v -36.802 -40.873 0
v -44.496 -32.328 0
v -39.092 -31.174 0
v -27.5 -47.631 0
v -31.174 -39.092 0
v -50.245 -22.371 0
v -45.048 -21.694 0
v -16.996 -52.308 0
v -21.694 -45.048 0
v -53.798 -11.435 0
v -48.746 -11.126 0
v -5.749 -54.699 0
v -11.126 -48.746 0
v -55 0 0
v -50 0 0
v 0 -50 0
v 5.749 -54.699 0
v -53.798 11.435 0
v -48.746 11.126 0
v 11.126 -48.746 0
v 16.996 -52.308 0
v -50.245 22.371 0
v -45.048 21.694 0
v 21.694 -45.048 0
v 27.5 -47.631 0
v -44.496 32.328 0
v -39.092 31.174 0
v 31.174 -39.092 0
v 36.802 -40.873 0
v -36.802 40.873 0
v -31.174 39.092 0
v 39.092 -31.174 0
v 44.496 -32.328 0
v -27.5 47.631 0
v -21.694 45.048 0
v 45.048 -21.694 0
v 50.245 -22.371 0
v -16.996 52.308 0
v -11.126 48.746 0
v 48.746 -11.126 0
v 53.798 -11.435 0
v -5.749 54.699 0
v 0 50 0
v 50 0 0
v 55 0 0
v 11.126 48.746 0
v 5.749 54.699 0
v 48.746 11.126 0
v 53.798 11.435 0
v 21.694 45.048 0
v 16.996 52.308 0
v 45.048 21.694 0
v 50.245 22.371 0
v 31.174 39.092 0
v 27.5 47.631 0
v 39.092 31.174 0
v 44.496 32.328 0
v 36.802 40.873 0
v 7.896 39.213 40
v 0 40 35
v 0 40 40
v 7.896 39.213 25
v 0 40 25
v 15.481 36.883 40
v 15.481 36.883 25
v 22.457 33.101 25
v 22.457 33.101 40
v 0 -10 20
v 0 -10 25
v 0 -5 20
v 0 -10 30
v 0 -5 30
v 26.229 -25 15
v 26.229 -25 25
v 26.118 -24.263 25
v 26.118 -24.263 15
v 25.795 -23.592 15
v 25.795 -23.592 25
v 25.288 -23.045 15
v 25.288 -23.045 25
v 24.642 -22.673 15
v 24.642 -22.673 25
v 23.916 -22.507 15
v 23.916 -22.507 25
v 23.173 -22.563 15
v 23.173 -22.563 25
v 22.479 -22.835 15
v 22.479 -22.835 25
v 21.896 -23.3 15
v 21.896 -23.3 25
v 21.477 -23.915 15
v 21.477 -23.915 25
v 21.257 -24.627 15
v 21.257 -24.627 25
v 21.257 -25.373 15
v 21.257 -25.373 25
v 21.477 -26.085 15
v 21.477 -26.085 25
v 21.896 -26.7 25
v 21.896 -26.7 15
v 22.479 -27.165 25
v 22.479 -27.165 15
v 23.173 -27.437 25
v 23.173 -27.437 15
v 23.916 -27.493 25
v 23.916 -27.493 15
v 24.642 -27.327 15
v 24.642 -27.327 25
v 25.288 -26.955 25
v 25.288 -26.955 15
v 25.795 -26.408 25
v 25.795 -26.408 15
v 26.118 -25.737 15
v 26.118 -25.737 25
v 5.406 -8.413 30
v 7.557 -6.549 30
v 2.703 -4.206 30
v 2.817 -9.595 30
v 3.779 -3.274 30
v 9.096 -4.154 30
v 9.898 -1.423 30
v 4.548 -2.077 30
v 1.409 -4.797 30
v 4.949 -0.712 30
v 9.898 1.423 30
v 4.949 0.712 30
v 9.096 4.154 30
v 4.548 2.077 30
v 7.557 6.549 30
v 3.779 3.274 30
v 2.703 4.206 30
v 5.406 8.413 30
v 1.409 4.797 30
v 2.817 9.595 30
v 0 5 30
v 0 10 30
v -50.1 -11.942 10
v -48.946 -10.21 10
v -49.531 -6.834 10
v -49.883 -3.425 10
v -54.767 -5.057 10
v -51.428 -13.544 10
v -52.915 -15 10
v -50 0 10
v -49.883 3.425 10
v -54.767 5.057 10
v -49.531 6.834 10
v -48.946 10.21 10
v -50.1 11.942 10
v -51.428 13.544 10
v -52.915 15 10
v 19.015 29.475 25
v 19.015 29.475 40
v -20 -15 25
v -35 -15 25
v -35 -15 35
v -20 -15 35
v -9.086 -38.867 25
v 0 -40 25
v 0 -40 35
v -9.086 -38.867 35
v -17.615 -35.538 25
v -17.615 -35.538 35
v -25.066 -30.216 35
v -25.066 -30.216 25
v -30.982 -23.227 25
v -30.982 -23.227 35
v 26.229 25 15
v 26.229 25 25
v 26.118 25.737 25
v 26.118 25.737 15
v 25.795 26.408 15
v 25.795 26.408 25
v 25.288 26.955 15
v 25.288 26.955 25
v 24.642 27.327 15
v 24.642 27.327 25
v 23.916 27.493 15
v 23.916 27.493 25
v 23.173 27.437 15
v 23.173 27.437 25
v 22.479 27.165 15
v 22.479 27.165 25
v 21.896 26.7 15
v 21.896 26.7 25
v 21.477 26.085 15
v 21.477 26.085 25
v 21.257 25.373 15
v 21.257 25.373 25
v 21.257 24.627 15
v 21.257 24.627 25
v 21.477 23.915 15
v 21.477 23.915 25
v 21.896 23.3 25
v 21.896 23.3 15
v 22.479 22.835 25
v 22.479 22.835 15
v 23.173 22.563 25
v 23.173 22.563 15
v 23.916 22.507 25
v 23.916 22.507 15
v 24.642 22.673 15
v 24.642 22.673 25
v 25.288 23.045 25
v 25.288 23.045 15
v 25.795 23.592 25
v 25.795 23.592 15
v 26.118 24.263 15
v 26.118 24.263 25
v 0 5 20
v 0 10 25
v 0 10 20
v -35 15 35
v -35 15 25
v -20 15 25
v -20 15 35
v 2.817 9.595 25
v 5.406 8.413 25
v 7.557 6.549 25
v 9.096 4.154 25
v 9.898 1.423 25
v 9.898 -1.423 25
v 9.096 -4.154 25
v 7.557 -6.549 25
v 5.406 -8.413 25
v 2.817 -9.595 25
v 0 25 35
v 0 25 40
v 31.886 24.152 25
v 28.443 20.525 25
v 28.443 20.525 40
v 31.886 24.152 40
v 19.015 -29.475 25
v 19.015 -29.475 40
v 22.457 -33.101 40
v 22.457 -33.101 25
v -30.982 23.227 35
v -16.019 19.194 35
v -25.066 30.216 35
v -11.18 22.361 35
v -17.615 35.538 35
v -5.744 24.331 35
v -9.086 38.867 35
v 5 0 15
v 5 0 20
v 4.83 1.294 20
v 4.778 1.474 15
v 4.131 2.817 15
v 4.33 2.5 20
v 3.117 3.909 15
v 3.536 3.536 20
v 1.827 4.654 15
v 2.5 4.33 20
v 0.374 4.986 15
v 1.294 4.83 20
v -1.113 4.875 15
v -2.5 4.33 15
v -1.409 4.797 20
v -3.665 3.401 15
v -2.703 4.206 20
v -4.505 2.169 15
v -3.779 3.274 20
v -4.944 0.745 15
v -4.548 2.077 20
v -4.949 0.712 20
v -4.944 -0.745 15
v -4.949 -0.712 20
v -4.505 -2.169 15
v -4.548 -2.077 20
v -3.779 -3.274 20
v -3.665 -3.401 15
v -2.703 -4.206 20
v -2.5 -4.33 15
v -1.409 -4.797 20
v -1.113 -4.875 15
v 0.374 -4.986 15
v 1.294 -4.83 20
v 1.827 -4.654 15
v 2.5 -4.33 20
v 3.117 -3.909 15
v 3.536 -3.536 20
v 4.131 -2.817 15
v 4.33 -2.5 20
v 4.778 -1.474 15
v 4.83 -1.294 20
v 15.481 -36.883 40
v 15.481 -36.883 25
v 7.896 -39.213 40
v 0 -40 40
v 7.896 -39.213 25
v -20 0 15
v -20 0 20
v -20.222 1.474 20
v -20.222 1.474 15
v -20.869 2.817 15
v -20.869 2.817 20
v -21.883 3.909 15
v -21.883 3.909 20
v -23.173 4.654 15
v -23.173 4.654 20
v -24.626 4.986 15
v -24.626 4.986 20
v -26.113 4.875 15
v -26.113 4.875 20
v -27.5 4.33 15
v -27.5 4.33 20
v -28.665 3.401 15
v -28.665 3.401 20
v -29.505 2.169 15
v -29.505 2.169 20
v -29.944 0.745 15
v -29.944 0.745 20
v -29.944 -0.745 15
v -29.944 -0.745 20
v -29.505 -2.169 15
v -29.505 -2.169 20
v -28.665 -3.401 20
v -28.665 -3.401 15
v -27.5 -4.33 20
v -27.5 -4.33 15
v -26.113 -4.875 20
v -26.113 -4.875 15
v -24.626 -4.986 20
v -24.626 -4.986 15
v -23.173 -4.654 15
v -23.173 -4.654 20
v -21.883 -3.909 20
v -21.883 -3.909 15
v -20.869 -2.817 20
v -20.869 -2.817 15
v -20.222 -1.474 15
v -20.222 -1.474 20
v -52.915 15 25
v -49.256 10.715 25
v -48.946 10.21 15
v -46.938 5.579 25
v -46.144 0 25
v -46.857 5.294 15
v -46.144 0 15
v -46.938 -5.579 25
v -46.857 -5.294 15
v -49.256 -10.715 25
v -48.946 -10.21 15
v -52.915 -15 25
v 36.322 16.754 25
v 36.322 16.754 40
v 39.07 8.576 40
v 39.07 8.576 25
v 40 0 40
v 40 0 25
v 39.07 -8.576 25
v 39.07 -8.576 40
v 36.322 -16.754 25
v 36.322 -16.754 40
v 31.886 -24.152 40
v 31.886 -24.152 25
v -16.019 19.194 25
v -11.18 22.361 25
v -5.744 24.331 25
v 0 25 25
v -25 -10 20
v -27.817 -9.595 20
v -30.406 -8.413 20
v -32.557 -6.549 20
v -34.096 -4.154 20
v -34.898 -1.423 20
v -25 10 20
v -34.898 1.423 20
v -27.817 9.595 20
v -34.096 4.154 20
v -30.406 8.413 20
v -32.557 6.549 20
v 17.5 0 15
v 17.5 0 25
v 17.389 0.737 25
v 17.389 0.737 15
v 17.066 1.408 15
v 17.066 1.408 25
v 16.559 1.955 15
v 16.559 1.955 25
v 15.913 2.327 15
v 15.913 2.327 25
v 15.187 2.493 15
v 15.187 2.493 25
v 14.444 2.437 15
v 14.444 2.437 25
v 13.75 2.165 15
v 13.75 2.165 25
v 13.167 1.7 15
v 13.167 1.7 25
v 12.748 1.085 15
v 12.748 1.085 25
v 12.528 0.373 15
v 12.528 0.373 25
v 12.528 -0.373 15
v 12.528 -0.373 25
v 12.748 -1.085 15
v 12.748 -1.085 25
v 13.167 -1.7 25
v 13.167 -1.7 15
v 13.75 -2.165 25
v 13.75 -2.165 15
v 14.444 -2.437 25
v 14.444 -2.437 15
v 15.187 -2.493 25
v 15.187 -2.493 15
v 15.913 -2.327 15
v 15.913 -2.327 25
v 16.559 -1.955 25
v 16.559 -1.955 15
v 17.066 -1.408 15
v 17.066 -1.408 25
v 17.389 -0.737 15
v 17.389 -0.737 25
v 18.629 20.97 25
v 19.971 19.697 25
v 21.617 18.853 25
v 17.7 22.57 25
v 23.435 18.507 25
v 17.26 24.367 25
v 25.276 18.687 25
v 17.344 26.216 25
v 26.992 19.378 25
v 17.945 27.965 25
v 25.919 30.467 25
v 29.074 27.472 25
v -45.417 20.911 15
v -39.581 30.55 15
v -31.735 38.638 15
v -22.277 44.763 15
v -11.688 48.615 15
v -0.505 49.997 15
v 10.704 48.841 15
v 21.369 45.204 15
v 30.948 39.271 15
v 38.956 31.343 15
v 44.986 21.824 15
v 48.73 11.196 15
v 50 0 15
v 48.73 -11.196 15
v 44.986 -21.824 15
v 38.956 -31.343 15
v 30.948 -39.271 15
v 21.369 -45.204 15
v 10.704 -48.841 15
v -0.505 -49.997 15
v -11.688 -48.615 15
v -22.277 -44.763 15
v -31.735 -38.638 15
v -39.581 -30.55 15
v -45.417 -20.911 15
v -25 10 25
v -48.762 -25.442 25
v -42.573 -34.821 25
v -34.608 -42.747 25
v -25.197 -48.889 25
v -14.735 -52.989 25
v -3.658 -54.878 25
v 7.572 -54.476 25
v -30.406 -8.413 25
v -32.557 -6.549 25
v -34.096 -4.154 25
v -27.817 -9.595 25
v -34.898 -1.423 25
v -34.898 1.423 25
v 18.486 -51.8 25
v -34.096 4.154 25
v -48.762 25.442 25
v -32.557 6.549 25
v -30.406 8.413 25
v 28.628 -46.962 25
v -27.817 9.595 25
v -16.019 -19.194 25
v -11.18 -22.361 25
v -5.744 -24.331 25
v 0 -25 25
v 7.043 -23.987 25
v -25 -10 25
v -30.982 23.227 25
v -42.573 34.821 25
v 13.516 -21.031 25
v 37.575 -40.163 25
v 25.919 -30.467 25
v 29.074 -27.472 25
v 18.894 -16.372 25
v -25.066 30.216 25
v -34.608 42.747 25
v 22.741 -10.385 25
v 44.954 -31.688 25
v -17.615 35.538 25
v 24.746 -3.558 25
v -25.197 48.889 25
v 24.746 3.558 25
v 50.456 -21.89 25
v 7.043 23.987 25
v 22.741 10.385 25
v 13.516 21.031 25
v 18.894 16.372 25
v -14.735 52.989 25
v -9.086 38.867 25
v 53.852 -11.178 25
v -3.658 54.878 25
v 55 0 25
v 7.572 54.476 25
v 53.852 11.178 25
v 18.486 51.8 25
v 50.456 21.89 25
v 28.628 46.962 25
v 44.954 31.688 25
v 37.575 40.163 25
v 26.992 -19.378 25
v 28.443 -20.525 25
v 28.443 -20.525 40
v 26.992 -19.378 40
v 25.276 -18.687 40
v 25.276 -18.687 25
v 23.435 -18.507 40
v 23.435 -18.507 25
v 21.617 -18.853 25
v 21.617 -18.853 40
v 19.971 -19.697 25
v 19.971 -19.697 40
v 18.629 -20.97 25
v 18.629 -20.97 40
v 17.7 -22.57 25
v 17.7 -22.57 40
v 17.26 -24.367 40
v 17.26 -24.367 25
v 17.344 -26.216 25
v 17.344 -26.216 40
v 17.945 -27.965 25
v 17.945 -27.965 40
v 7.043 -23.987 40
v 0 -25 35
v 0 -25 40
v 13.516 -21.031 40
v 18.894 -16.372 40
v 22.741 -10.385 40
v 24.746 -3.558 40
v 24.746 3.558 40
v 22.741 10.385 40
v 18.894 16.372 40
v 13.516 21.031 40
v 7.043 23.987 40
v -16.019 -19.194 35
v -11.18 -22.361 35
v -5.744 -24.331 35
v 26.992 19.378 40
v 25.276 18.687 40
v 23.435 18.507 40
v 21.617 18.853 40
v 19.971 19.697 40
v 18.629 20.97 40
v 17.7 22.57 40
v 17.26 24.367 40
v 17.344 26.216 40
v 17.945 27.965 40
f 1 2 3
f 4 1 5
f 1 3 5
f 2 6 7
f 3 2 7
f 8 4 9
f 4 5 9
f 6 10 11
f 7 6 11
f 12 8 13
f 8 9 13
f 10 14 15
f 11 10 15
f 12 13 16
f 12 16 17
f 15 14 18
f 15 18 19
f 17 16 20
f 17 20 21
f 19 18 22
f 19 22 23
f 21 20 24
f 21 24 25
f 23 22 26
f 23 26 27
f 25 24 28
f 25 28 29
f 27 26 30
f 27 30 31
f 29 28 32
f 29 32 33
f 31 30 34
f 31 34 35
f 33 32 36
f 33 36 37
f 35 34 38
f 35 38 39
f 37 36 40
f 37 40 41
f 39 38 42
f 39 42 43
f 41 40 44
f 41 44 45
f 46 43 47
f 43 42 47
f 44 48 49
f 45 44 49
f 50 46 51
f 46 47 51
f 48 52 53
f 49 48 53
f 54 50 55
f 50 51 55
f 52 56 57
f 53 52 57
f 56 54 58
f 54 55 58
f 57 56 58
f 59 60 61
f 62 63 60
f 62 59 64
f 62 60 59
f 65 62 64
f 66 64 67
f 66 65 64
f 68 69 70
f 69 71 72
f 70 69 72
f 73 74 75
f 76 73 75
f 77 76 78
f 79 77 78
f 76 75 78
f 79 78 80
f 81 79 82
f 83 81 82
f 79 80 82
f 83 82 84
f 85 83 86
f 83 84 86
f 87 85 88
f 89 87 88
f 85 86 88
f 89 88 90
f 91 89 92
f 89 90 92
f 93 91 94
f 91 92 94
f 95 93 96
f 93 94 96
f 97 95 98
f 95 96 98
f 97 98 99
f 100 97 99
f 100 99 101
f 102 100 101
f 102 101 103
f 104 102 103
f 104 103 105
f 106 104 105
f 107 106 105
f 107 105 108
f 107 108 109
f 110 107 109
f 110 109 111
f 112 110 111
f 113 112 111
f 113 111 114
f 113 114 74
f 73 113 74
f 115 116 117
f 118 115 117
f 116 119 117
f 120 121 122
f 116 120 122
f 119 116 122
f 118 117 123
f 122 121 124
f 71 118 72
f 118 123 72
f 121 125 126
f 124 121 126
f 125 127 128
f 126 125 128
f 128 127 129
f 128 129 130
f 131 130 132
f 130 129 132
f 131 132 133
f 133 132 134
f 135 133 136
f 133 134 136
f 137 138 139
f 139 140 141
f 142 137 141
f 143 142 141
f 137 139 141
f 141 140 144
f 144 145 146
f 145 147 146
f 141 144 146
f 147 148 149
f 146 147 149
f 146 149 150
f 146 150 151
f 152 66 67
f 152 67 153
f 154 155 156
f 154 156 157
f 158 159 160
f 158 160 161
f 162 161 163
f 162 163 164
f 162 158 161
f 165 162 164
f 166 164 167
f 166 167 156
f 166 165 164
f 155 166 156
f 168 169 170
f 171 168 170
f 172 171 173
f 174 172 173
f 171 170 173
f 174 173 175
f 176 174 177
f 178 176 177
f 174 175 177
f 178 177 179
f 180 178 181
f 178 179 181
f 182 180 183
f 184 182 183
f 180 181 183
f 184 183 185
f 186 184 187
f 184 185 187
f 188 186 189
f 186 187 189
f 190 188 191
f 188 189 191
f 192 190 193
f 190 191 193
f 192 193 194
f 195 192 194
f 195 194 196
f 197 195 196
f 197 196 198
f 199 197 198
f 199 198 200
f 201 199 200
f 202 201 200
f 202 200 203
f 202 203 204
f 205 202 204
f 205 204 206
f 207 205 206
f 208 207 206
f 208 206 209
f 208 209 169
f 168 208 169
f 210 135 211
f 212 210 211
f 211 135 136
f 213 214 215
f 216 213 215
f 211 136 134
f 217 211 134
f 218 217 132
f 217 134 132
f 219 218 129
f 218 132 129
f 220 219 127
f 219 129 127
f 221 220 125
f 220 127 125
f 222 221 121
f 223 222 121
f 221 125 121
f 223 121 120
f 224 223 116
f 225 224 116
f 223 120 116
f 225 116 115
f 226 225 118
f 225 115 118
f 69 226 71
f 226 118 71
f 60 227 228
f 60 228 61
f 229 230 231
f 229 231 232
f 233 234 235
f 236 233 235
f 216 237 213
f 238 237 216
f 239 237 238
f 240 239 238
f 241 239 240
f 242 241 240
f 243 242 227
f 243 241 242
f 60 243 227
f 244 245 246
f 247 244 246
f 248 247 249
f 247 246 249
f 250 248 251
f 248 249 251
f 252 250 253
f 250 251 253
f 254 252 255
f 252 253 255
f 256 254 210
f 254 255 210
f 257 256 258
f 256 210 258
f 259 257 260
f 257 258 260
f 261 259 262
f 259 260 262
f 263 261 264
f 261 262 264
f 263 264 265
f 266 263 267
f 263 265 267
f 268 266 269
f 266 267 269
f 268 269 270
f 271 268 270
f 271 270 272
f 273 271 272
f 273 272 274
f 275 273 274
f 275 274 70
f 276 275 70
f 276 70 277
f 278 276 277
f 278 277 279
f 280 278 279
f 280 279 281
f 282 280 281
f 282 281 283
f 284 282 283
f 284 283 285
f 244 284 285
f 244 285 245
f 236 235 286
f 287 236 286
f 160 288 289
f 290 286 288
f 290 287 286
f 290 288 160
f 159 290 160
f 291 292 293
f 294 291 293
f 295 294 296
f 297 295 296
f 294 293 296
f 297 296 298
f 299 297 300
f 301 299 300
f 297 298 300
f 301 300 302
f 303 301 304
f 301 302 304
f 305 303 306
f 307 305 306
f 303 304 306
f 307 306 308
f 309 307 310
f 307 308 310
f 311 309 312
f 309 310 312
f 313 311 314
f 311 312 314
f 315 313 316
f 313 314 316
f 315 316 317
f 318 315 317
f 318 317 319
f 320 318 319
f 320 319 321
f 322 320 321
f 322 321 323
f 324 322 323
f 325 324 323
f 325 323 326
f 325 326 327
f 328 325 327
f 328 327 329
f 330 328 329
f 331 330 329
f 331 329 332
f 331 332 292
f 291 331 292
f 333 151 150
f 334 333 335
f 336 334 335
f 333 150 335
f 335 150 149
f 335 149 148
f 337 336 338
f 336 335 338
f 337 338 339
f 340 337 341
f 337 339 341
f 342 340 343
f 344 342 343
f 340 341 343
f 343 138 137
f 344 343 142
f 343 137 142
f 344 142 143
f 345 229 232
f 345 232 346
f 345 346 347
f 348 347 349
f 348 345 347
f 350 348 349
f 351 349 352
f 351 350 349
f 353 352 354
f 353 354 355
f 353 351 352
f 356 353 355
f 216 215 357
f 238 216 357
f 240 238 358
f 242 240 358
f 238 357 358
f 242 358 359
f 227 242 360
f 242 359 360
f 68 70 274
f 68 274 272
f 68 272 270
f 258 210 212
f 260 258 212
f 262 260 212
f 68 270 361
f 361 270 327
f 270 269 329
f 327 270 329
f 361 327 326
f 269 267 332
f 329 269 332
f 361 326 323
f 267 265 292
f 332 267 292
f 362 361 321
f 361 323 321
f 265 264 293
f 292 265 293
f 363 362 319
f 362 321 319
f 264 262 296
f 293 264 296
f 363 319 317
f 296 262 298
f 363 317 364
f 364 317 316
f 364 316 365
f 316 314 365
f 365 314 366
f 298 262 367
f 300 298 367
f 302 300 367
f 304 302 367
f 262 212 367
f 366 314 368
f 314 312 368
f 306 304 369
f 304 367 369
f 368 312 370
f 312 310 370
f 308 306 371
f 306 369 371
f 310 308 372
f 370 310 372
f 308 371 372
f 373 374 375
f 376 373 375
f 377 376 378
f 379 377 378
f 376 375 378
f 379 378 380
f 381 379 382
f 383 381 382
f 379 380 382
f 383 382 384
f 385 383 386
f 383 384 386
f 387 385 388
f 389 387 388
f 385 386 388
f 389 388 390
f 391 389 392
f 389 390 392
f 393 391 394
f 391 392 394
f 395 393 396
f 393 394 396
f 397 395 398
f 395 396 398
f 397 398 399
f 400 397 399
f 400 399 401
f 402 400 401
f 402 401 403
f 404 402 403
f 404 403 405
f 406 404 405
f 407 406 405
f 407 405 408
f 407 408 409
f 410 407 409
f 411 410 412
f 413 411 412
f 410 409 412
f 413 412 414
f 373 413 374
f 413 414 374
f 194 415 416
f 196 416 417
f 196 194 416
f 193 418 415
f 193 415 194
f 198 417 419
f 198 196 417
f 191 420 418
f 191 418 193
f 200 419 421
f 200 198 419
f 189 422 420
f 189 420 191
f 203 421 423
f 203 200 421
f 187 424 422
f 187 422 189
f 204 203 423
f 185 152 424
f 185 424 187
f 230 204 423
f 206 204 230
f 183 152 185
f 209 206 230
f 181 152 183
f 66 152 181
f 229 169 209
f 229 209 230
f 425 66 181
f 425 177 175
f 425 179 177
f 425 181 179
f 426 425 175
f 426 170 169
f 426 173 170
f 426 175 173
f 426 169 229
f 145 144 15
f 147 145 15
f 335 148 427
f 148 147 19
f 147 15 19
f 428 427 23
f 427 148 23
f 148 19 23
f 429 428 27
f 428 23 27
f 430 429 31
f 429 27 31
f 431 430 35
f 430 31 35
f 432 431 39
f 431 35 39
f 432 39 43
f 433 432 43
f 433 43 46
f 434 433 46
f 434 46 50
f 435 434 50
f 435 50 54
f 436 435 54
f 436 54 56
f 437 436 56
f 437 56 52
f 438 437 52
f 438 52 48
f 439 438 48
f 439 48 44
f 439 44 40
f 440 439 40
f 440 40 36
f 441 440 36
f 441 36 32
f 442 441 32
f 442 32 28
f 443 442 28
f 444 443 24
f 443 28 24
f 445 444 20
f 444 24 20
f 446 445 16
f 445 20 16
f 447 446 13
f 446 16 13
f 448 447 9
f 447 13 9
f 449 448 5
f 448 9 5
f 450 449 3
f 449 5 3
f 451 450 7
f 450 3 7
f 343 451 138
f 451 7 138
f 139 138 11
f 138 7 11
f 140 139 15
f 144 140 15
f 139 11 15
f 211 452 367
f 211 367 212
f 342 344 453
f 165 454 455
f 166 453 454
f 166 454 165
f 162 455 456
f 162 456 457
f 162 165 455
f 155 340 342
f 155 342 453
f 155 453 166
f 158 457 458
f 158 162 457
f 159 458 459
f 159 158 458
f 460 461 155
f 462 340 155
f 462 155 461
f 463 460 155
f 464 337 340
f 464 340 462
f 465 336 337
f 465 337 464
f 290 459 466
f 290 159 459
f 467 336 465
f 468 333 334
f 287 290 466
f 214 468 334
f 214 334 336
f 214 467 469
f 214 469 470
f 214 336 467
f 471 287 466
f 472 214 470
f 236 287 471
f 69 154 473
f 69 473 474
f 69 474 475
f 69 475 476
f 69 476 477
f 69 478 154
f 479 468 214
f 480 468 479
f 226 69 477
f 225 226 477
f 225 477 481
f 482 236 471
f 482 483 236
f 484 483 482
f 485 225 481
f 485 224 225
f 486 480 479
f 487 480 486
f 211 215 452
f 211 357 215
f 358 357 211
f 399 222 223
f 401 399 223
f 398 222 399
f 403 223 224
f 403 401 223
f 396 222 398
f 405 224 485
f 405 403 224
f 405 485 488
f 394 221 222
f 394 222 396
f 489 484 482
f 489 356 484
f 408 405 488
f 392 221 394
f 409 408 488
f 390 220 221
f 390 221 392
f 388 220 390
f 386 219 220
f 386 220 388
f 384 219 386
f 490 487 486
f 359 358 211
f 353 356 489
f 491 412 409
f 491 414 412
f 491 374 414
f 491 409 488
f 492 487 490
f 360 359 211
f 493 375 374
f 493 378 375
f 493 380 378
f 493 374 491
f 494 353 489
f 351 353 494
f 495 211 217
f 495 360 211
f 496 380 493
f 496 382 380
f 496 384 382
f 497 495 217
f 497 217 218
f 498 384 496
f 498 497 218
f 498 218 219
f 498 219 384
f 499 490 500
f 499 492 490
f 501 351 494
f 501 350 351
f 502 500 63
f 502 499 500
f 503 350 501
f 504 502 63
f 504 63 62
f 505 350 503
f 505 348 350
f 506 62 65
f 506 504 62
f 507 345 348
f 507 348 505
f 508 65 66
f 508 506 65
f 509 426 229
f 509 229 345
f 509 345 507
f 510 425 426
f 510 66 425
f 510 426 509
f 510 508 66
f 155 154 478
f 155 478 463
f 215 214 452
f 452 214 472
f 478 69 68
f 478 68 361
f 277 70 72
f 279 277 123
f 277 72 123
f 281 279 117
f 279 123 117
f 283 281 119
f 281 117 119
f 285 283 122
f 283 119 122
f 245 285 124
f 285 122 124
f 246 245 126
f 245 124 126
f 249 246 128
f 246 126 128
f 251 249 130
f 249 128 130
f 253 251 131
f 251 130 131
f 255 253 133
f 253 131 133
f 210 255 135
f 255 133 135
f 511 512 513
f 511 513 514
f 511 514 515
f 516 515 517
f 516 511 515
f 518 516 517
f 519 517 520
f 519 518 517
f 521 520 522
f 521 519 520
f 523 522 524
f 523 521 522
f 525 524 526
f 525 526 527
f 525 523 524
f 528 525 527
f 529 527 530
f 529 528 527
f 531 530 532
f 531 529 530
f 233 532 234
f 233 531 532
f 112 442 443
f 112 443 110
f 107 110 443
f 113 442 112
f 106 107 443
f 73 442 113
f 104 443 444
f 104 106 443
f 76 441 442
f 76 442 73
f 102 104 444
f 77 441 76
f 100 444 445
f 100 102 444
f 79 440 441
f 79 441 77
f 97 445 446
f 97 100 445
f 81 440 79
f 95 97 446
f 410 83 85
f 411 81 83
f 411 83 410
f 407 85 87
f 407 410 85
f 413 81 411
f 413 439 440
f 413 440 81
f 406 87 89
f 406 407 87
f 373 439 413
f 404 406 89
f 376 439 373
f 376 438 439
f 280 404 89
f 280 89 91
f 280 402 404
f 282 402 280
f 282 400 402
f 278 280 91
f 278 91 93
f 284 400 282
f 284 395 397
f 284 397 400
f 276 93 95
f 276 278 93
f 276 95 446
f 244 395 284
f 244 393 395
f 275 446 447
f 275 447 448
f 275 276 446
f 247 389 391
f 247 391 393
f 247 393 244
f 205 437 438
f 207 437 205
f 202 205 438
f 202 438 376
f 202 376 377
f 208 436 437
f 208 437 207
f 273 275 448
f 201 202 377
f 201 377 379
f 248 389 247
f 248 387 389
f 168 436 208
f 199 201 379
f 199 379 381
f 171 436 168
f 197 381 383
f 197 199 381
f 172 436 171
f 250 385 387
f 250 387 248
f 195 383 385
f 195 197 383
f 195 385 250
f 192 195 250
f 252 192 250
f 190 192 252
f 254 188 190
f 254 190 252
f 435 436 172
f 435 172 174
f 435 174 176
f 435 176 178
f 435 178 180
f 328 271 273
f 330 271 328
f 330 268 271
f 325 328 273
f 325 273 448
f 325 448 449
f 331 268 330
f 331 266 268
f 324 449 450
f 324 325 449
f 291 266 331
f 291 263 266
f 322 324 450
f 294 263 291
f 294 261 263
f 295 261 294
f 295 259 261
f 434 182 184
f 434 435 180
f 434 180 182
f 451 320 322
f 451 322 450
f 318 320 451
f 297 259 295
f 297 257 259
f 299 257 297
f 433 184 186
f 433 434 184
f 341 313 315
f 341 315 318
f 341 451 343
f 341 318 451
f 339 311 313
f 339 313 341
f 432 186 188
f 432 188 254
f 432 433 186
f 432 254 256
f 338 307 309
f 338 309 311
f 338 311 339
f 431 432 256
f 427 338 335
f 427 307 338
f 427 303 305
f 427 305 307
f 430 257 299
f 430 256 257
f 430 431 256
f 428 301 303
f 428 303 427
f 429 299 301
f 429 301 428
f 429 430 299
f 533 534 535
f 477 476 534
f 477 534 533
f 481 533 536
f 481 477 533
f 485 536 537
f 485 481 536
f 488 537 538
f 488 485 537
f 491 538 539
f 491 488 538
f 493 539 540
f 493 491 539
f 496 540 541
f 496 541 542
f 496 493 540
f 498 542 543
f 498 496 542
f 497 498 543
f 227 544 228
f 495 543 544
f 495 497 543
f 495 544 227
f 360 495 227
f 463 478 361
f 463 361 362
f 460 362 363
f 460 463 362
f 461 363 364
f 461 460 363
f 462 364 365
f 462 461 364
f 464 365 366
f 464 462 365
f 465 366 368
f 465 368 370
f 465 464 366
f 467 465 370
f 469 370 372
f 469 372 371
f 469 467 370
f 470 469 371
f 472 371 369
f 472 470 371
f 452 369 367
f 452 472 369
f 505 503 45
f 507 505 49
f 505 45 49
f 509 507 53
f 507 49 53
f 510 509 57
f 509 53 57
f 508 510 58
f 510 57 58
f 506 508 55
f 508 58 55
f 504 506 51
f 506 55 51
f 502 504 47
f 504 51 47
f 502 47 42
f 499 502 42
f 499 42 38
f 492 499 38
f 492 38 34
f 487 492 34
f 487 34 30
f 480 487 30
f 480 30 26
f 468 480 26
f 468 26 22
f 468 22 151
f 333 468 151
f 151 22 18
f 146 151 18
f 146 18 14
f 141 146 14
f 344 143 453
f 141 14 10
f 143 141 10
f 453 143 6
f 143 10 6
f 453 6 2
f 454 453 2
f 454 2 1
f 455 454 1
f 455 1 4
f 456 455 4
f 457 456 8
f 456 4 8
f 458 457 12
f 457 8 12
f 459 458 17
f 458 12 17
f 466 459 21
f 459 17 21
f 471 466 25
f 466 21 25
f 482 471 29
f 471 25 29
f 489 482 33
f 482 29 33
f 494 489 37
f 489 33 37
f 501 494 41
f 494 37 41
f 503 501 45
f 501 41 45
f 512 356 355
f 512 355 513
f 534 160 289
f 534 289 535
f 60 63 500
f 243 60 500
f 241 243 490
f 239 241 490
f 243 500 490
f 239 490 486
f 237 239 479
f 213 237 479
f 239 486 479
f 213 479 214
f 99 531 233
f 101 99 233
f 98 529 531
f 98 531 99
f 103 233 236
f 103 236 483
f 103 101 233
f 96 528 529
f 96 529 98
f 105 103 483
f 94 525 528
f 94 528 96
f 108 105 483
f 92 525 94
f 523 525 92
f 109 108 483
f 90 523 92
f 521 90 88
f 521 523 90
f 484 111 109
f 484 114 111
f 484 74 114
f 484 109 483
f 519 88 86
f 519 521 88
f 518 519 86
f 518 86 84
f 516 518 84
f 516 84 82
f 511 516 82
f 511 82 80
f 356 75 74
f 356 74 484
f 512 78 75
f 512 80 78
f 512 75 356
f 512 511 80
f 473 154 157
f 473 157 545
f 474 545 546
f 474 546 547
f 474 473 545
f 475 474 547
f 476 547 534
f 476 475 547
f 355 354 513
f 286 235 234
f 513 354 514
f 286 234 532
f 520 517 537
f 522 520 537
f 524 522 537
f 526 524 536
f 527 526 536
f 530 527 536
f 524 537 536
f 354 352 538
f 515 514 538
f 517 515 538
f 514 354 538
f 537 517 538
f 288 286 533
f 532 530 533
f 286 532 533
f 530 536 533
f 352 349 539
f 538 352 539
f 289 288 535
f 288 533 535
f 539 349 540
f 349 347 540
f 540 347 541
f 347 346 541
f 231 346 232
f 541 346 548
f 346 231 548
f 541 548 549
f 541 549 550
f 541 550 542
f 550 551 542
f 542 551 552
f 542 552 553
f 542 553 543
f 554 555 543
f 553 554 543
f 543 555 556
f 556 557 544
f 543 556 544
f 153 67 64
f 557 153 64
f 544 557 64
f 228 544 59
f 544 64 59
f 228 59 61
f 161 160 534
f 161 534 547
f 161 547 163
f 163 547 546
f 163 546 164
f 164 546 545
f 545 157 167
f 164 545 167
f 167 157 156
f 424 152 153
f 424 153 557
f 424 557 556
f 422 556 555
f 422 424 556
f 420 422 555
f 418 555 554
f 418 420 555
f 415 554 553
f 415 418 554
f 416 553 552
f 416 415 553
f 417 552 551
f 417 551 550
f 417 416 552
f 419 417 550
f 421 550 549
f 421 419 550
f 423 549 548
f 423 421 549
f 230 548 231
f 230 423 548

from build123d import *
from build123d.topology import SkipClean

# Parameters (mm, degrees)
SKETCH3_R           = 55
BOSS_EXTRUDE2_DEPTH = 25
SKETCH4_R           = 50
CUT_EXTRUDE1_DEPTH  = 15
CUT_EXTRUDE2_START  = -15
CUT_EXTRUDE2_DEPTH  = 15
BOSS_EXTRUDE3_DEPTH = 10
BOSS_EXTRUDE4_DEPTH = 10
BOSS_EXTRUDE5_DEPTH = 15
CUT_EXTRUDE4_START  = -15
CUT_EXTRUDE4_DEPTH  = 15
SKETCH11_R          = 2.5
CUT_EXTRUDE7_DEPTH  = 25
SKETCH12_R          = 2.5
CUT_EXTRUDE9_DEPTH  = 10
CUT_EXTRUDE12_DEPTH = 5
SKETCH14_R          = 5
CUT_EXTRUDE13_DEPTH = 10
BOSS_EXTRUDE6_START = 10
BOSS_EXTRUDE6_DEPTH = 10


with BuildPart() as part:
    # Sketch3 → Boss-Extrude2 (new body)
    with BuildSketch(Plane.XY):
        Circle(SKETCH3_R)
    extrude(amount=BOSS_EXTRUDE2_DEPTH)

    # Sketch4 → Cut-Extrude1 (cut)
    with BuildSketch(Plane(origin=(0, 0, 0), x_dir=(-1, 0, 0), z_dir=(0, 0, -1))):
        Circle(SKETCH4_R)
    extrude(amount=-CUT_EXTRUDE1_DEPTH, mode=Mode.SUBTRACT)

    # Sketch5 → Cut-Extrude2 (cut)
    with BuildSketch(Plane.XY.offset(25).offset(CUT_EXTRUDE2_START)):
        with BuildLine():
            ThreePointArc((-52.915026221, 15), (-46.143782777, 0), (-52.915026221, -15))
            ThreePointArc((-52.915026221, -15), (-55, 0), (-52.915026221, 15))
        make_face()
    extrude(amount=CUT_EXTRUDE2_DEPTH, mode=Mode.SUBTRACT)

    # Sketch6 → Boss-Extrude3 (add)
    with BuildSketch(Plane.XY.offset(25)):
        with BuildLine():
            Line((-35, 15), (-20, 15))
            ThreePointArc((-20, 15), (-11.180339887, 22.360679775), (0, 25))
            Line((0, 25), (0, 40))
            ThreePointArc((0, 40), (-21.505813168, 33.108138435), (-35, 15))
        make_face()
    extrude(amount=BOSS_EXTRUDE3_DEPTH)

    # Sketch7 → Boss-Extrude4 (add)
    with BuildSketch(Plane.XY.offset(25)):
        with BuildLine():
            Line((-35, -15), (-20, -15))
            ThreePointArc((-20, -15), (-11.180339887, -22.360679775), (0, -25))
            Line((0, -25), (0, -40))
            ThreePointArc((0, -40), (-21.505813168, -33.108138435), (-35, -15))
        make_face()
    extrude(amount=BOSS_EXTRUDE4_DEPTH)

    # Sketch8 → Boss-Extrude5 (add)
    with SkipClean():  # the faces are left unmerged after this step: merging them gives an invalid solid
        with BuildSketch(Plane.XY.offset(25)):
            with BuildLine():
                Line((0, -40), (0, -25))
                ThreePointArc((0, -25), (25, 0), (0, 25))
                Line((0, 25), (0, 40))
                ThreePointArc((0, 40), (40, 0), (0, -40))
            make_face()
        extrude(amount=BOSS_EXTRUDE5_DEPTH)

    # Sketch9 → Cut-Extrude4 (cut)
    with SkipClean():  # the faces are left unmerged after this step: merging them gives an invalid solid
        with BuildSketch(Plane.XY.offset(40).offset(CUT_EXTRUDE4_START)):
            with BuildLine():
                Line((19.014552984, -29.474791897), (22.456700597, -33.101308106))
                ThreePointArc((22.456700597, -33.101308106), (27.537180907, -29.012129665), (31.885642738, -24.151724311))
                Line((31.885642738, -24.151724311), (28.443495125, -20.525208103))
                ThreePointArc((28.443495125, -20.525208103), (19.254232157, -20.285528929), (19.014552984, -29.474791897))
            make_face()
            with BuildLine():
                Line((22.456700597, 33.101308106), (19.014552984, 29.474791897))
                ThreePointArc((19.014552984, 29.474791897), (19.254232157, 20.285528929), (28.443495125, 20.525208103))
                Line((28.443495125, 20.525208103), (31.885642738, 24.151724311))
                ThreePointArc((31.885642738, 24.151724311), (27.537180907, 29.012129665), (22.456700597, 33.101308106))
            make_face()
        extrude(amount=CUT_EXTRUDE4_DEPTH, mode=Mode.SUBTRACT)

    # Sketch11 → Cut-Extrude7 (cut)
    with SkipClean():  # the faces are left unmerged after this step: merging them gives an invalid solid
        with BuildSketch(Plane.XY.offset(25)):
            with Locations((23.729024054, -25)):
                Circle(SKETCH11_R)
            with Locations((23.729024054, 25)):
                Circle(SKETCH11_R)
        extrude(amount=-CUT_EXTRUDE7_DEPTH, mode=Mode.SUBTRACT)

    # Sketch12 → Cut-Extrude9 (cut)
    with SkipClean():  # the faces are left unmerged after this step: merging them gives an invalid solid
        with BuildSketch(Plane.XY.offset(25)):
            with Locations((15, 0)):
                Circle(SKETCH12_R)
        extrude(amount=-CUT_EXTRUDE9_DEPTH, mode=Mode.SUBTRACT)

    # Sketch13 → Cut-Extrude12 (cut)
    with SkipClean():  # the faces are left unmerged after this step: merging them gives an invalid solid
        with BuildSketch(Plane.XY.offset(25)):
            with BuildLine():
                Line((-25, 10), (0, 10))
                ThreePointArc((0, 10), (10, 0), (0, -10))
                Line((0, -10), (-25, -10))
                ThreePointArc((-25, -10), (-35, 0), (-25, 10))
            make_face()
        extrude(amount=-CUT_EXTRUDE12_DEPTH, mode=Mode.SUBTRACT)

    # Sketch14 → Cut-Extrude13 (cut)
    with SkipClean():  # the faces are left unmerged after this step: merging them gives an invalid solid
        with BuildSketch(Plane.XY.offset(20)):
            with Locations((-25, 0)):
                Circle(SKETCH14_R)
            Circle(SKETCH14_R)
        extrude(amount=-CUT_EXTRUDE13_DEPTH, mode=Mode.SUBTRACT)

    # Sketch15 → Boss-Extrude6 (add)
    with SkipClean():  # the faces are left unmerged after this step: merging them gives an invalid solid
        with BuildSketch(Plane.XY.offset(20).offset(BOSS_EXTRUDE6_START)):
            with BuildLine():
                Line((0, 5), (0, 10))
                ThreePointArc((0, 10), (10, 0), (0, -10))
                Line((0, -10), (0, -5))
                ThreePointArc((0, -5), (5, 0), (0, 5))
            make_face()
        extrude(amount=-BOSS_EXTRUDE6_DEPTH)


solid = part.part
